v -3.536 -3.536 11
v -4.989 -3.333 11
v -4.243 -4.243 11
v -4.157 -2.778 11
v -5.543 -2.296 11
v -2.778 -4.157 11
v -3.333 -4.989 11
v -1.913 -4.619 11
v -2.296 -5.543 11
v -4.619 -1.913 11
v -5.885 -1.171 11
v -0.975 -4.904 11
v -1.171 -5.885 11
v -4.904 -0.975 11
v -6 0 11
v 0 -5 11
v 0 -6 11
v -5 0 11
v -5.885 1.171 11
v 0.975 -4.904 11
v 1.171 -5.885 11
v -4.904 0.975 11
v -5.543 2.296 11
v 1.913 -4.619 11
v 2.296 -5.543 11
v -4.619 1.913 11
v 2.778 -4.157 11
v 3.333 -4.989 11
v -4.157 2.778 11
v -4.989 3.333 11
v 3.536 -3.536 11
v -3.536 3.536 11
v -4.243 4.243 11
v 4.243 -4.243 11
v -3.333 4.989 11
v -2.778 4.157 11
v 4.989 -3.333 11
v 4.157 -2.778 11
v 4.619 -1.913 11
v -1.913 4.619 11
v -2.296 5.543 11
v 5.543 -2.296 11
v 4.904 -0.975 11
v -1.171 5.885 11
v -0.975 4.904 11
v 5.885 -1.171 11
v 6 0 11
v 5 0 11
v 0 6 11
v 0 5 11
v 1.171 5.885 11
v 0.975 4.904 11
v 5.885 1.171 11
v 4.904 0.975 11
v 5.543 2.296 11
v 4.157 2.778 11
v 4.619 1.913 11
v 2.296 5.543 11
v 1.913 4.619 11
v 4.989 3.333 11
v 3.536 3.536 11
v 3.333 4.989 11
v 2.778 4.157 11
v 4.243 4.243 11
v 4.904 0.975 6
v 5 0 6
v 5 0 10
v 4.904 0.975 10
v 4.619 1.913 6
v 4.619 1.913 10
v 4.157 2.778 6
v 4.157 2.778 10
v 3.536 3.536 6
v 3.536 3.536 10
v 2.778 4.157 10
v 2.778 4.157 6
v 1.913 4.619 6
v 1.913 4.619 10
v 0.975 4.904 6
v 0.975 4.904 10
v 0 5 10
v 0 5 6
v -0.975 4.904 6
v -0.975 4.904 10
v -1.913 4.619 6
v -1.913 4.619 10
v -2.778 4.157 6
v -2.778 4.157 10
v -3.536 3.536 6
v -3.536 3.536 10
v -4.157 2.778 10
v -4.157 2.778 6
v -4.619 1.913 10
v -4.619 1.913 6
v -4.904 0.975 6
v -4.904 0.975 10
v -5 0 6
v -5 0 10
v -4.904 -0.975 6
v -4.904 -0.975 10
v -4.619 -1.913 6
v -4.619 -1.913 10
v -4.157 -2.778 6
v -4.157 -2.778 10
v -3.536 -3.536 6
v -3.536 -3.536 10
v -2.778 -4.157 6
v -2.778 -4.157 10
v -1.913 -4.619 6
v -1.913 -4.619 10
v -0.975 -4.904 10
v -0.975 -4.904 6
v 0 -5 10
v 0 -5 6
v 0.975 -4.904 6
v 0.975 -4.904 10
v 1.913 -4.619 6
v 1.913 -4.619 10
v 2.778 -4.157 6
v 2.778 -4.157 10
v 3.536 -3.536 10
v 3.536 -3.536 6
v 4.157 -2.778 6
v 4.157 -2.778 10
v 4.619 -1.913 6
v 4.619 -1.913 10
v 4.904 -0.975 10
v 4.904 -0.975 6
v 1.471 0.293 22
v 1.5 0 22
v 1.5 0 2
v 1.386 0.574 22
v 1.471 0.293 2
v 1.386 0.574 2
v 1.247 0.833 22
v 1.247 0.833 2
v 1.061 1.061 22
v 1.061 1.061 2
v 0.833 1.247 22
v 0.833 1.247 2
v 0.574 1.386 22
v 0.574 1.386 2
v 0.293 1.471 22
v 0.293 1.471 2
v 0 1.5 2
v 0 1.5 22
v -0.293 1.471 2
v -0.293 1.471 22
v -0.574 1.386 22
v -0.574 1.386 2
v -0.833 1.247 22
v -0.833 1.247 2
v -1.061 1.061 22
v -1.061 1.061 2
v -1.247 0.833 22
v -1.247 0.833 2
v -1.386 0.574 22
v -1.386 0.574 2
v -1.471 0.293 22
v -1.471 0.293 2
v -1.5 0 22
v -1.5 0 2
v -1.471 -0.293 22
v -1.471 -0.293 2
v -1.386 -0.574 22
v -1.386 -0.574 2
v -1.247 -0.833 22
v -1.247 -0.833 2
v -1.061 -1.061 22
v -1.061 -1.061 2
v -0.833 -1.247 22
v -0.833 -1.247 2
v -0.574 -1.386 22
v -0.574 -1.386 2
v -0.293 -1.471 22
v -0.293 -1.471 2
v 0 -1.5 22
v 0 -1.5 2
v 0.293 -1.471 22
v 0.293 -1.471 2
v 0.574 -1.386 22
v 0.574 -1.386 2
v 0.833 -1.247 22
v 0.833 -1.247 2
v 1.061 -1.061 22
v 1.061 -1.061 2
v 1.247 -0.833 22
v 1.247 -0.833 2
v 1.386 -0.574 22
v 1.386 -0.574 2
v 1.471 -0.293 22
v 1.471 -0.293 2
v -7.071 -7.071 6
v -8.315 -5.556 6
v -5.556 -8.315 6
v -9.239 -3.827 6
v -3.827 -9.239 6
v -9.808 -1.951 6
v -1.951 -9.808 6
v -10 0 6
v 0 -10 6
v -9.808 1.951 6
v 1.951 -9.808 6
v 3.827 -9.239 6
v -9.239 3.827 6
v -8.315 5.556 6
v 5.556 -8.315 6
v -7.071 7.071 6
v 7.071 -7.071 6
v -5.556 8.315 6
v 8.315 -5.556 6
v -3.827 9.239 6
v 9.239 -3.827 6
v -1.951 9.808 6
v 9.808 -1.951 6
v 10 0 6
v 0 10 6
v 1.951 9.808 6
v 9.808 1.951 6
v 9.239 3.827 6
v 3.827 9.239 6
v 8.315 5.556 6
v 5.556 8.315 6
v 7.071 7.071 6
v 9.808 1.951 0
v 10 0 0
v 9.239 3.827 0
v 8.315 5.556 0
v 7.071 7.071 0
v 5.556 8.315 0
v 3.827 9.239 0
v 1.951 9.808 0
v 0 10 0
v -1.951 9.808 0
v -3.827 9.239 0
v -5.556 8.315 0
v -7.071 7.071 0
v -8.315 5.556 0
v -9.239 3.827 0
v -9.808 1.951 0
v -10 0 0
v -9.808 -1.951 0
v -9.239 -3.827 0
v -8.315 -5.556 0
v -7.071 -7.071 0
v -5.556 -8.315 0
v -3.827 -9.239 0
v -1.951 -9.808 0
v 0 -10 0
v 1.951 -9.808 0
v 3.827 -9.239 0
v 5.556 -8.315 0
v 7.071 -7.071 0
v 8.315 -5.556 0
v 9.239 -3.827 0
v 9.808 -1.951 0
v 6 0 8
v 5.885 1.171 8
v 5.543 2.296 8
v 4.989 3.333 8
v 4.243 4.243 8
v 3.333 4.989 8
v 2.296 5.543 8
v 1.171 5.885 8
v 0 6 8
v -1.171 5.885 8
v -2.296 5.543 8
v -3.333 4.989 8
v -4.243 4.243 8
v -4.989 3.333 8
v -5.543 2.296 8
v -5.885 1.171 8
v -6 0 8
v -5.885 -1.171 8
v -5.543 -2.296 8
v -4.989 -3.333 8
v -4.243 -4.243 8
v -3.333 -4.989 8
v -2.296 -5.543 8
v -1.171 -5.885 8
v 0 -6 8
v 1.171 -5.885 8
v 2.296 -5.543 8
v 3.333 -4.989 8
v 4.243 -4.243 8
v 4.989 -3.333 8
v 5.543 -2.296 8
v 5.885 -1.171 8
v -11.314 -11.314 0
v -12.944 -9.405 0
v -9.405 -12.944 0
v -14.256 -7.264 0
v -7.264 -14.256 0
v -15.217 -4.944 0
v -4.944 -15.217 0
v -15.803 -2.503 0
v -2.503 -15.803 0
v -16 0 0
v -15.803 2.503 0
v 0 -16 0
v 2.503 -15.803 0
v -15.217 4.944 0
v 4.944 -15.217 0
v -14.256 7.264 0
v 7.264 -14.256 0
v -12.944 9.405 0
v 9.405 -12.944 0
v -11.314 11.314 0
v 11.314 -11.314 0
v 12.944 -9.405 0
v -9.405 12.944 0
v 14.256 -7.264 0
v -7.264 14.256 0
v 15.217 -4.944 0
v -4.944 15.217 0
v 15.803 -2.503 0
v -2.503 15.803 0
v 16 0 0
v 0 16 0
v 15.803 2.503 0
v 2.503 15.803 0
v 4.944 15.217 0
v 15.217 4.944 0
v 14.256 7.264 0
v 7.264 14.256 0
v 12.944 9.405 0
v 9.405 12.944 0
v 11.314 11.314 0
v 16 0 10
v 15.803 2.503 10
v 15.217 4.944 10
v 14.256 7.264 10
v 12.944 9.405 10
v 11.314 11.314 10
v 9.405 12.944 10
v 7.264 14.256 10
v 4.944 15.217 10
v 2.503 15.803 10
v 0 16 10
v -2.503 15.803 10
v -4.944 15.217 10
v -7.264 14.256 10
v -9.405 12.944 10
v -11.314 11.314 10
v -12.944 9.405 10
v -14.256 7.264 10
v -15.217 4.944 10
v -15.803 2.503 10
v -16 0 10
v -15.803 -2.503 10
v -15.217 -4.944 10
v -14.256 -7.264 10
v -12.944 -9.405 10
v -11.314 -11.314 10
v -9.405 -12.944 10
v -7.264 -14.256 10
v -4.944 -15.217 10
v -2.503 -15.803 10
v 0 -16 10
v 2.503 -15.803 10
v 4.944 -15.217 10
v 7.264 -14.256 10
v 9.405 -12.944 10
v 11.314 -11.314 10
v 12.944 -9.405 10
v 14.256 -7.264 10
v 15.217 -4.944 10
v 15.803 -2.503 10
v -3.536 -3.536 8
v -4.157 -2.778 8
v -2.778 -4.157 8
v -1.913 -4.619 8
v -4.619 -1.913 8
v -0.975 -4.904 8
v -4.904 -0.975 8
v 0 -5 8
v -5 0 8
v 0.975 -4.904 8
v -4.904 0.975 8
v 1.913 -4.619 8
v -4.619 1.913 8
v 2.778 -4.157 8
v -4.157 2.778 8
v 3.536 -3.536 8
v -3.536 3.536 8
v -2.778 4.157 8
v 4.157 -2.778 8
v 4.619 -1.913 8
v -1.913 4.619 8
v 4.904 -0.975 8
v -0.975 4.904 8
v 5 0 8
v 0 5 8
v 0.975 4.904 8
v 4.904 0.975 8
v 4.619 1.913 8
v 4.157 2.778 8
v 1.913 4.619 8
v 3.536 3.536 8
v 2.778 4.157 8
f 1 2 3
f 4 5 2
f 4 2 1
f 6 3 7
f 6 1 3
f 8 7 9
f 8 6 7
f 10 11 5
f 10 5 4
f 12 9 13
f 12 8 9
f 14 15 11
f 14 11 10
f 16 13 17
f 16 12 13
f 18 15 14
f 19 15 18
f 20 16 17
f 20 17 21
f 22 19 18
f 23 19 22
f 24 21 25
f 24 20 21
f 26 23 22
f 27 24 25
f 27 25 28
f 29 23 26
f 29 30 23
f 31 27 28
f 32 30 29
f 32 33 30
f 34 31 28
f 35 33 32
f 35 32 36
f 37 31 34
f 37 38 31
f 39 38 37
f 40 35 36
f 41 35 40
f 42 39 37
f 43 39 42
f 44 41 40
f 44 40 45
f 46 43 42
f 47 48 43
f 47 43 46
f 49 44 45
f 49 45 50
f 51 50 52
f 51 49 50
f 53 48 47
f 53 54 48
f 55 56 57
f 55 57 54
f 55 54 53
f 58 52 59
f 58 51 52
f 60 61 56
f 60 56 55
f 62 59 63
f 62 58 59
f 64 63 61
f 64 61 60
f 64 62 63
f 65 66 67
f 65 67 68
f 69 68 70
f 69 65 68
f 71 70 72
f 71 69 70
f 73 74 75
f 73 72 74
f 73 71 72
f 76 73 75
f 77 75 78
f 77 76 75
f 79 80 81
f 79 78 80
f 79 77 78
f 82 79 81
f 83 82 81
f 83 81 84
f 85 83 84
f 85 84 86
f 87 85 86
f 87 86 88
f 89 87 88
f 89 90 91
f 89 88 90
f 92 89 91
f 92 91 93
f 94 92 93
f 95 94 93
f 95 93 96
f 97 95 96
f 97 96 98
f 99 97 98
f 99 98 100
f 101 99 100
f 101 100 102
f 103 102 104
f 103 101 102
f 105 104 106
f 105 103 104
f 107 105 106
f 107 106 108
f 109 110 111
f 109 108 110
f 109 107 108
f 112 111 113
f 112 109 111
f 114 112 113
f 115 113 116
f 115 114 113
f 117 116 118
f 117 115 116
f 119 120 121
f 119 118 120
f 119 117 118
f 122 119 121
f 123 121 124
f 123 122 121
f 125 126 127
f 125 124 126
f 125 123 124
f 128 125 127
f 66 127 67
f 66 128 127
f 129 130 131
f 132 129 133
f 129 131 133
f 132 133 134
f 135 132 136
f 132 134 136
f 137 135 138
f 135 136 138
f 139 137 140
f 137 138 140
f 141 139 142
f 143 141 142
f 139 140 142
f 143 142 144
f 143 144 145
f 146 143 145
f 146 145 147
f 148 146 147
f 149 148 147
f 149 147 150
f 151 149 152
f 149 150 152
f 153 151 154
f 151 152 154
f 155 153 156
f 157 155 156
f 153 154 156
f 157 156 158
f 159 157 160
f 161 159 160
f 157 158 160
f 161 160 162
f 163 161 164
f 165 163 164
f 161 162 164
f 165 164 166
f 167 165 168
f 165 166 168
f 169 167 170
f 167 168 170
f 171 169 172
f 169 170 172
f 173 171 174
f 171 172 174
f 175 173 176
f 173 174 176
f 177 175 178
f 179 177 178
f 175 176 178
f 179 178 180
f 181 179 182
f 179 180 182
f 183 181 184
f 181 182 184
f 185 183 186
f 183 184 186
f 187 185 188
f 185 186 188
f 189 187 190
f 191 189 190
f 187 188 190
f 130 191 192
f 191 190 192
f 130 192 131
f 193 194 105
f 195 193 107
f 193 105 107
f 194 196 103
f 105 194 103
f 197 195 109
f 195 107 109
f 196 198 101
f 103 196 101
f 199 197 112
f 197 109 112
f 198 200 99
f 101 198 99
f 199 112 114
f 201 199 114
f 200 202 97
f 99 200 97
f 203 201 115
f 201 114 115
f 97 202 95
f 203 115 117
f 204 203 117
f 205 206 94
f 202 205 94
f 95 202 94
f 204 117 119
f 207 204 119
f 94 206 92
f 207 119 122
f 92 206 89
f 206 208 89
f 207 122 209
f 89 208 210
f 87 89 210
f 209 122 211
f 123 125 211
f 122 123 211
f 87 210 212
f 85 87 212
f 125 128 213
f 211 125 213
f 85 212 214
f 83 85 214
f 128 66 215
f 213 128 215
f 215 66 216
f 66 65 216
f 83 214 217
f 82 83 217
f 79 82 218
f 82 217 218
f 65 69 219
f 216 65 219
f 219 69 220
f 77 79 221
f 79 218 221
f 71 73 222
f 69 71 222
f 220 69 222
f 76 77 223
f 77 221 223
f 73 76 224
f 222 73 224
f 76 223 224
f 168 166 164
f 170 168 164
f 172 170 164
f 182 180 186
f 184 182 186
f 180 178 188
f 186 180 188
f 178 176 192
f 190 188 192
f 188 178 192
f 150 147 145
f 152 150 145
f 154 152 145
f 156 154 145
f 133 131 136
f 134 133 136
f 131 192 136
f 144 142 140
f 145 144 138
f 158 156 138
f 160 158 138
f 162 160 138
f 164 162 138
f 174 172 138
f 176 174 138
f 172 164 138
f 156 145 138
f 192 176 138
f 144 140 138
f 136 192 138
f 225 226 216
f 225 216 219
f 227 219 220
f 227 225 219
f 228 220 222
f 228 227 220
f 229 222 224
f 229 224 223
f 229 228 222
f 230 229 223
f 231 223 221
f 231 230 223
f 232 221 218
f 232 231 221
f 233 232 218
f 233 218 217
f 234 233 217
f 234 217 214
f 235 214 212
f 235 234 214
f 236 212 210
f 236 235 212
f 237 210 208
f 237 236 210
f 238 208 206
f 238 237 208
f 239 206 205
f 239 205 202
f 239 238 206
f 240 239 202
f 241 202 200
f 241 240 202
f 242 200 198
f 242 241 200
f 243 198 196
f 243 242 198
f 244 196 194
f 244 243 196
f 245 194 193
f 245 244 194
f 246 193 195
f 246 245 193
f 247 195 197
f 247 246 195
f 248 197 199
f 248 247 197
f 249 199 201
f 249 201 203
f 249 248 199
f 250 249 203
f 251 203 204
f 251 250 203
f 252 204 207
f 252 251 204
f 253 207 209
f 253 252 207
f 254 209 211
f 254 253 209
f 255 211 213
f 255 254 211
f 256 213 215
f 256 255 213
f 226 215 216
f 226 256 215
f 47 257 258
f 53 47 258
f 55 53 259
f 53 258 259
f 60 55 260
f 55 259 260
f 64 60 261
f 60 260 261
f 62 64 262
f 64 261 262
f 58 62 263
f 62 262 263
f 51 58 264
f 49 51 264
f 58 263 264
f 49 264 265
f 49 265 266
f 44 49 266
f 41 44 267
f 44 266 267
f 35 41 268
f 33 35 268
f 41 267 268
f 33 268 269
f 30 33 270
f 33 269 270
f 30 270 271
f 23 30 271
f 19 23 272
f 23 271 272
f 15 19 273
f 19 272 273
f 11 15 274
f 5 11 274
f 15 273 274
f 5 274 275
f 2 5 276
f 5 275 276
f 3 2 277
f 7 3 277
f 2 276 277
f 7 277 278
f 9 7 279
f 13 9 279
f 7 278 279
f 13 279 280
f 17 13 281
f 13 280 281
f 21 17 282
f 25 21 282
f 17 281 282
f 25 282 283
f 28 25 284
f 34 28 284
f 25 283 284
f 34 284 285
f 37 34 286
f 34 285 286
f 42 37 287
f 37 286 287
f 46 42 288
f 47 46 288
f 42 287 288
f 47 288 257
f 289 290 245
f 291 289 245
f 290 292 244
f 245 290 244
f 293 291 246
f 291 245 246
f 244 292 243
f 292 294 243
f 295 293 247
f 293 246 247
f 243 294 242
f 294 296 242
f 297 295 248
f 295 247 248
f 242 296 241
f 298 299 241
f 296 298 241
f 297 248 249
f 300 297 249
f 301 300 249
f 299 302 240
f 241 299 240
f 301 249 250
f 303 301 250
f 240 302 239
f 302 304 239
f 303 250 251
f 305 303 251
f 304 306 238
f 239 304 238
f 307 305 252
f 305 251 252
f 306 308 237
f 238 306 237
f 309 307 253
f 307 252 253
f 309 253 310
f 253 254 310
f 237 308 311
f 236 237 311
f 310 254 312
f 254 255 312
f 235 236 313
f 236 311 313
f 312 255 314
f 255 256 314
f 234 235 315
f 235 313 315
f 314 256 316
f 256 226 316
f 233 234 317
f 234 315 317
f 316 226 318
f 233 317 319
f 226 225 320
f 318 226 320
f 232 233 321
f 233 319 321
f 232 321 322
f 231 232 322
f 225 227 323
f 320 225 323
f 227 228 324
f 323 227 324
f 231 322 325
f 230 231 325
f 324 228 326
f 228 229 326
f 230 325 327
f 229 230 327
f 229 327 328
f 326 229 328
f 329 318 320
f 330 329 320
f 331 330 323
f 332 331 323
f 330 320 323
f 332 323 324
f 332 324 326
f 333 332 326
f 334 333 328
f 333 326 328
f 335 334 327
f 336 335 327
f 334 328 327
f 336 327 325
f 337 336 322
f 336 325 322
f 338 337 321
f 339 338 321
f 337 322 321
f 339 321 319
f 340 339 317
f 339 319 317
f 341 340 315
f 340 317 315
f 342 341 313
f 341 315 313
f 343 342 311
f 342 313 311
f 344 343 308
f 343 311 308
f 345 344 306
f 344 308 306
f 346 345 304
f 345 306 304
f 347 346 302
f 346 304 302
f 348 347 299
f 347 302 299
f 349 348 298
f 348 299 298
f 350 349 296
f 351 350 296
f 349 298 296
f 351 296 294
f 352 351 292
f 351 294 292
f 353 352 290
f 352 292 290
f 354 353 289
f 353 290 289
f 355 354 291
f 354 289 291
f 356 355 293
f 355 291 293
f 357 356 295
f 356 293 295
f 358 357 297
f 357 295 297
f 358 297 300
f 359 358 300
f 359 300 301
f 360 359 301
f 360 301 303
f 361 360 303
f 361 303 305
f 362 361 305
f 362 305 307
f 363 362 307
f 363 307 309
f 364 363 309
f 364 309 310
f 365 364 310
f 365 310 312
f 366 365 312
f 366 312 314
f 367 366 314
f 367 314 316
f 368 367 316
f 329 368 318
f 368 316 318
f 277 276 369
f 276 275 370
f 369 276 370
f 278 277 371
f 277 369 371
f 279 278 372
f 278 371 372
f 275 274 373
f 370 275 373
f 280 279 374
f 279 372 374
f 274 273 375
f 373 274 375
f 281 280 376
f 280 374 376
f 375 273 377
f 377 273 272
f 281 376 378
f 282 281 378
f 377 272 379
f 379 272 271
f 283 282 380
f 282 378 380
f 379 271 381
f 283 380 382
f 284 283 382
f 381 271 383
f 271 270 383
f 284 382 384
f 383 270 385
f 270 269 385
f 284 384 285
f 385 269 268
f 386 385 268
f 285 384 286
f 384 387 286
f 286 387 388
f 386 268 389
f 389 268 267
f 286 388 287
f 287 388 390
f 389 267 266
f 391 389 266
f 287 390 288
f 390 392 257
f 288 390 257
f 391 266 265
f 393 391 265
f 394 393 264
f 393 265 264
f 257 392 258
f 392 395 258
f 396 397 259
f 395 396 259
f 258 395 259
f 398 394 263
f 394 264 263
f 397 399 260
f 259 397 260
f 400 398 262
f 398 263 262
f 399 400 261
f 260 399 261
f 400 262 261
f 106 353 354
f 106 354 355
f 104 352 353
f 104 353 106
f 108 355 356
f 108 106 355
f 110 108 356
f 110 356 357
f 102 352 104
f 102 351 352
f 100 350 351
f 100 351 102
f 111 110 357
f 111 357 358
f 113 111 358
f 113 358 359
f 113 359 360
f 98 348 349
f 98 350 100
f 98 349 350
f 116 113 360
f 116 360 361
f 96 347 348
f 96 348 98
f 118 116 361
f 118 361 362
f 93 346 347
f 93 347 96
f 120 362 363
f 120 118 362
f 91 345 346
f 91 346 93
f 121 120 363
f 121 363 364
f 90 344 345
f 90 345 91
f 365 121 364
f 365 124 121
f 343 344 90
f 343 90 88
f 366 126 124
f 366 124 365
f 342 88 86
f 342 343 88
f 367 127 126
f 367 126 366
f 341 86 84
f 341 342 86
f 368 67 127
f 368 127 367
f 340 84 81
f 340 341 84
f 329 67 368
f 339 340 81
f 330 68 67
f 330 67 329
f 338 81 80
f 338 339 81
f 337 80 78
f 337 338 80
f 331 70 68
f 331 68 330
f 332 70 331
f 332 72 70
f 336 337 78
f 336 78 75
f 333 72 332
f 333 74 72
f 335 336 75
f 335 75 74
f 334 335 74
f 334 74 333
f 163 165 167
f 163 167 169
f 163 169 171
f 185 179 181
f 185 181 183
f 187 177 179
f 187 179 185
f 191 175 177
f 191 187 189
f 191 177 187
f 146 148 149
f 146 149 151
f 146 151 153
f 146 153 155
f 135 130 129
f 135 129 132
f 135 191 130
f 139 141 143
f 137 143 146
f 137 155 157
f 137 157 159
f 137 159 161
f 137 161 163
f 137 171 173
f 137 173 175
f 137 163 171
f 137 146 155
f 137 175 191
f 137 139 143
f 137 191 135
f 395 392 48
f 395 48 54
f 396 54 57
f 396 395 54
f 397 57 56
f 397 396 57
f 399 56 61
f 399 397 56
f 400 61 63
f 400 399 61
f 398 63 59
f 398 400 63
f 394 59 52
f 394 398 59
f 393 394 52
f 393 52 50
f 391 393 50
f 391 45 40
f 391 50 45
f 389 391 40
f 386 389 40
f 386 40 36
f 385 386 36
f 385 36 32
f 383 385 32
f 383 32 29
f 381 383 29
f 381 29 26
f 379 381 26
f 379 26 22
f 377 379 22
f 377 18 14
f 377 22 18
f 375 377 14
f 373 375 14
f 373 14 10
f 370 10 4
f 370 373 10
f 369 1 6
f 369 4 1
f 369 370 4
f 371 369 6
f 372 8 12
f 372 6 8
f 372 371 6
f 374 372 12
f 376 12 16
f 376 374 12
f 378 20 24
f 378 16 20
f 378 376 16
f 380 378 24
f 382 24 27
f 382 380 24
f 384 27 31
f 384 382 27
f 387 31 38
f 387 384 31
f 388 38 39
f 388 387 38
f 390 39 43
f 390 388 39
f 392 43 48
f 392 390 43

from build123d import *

# Parameters (mm, degrees)
CYLINDER002_R     = 5
CYLINDER002_DEPTH = 12
CYLINDER001_R     = 10
CYLINDER001_DEPTH = 6
CYLINDER_R        = 16
CYLINDER_DEPTH    = 10
CYLINDER005_R     = 1.5
CYLINDER005_DEPTH = 20
CYLINDER004_R     = 5
CYLINDER004_DEPTH = 13
CYLINDER003_R     = 6
CYLINDER003_DEPTH = 3


with BuildPart() as cylinder002:
    # Cylinder002 → Cylinder002 (new body)
    with BuildSketch(Plane.XY):
        Circle(CYLINDER002_R)
    extrude(amount=CYLINDER002_DEPTH)


with BuildPart() as cylinder001:
    # Cylinder001 → Cylinder001 (new body)
    with BuildSketch(Plane.XY):
        Circle(CYLINDER001_R)
    extrude(amount=CYLINDER001_DEPTH)


with BuildPart() as cut001:
    # Cylinder → Cylinder (new body)
    with BuildSketch(Plane.XY):
        Circle(CYLINDER_R)
    extrude(amount=CYLINDER_DEPTH)

    # Cut: cut Cylinder001
    add(cylinder001.part, mode=Mode.SUBTRACT)

    # Cut001: cut Cylinder002
    add(cylinder002.part, mode=Mode.SUBTRACT)


with BuildPart() as cylinder005:
    # Cylinder005 → Cylinder005 (new body)
    with BuildSketch(Plane.XY.offset(2)):
        Circle(CYLINDER005_R)
    extrude(amount=CYLINDER005_DEPTH)


with BuildPart() as cylinder004:
    # Cylinder004 → Cylinder004 (new body)
    with BuildSketch(Plane.XY):
        Circle(CYLINDER004_R)
    extrude(amount=CYLINDER004_DEPTH)


with BuildPart() as cut002:
    # Cylinder003 → Cylinder003 (new body)
    with BuildSketch(Plane.XY.offset(8)):
        Circle(CYLINDER003_R)
    extrude(amount=CYLINDER003_DEPTH)

    # Cut002: cut Cylinder004
    add(cylinder004.part, mode=Mode.SUBTRACT)


solid = Compound([cut001.part, cylinder005.part, cut002.part])
